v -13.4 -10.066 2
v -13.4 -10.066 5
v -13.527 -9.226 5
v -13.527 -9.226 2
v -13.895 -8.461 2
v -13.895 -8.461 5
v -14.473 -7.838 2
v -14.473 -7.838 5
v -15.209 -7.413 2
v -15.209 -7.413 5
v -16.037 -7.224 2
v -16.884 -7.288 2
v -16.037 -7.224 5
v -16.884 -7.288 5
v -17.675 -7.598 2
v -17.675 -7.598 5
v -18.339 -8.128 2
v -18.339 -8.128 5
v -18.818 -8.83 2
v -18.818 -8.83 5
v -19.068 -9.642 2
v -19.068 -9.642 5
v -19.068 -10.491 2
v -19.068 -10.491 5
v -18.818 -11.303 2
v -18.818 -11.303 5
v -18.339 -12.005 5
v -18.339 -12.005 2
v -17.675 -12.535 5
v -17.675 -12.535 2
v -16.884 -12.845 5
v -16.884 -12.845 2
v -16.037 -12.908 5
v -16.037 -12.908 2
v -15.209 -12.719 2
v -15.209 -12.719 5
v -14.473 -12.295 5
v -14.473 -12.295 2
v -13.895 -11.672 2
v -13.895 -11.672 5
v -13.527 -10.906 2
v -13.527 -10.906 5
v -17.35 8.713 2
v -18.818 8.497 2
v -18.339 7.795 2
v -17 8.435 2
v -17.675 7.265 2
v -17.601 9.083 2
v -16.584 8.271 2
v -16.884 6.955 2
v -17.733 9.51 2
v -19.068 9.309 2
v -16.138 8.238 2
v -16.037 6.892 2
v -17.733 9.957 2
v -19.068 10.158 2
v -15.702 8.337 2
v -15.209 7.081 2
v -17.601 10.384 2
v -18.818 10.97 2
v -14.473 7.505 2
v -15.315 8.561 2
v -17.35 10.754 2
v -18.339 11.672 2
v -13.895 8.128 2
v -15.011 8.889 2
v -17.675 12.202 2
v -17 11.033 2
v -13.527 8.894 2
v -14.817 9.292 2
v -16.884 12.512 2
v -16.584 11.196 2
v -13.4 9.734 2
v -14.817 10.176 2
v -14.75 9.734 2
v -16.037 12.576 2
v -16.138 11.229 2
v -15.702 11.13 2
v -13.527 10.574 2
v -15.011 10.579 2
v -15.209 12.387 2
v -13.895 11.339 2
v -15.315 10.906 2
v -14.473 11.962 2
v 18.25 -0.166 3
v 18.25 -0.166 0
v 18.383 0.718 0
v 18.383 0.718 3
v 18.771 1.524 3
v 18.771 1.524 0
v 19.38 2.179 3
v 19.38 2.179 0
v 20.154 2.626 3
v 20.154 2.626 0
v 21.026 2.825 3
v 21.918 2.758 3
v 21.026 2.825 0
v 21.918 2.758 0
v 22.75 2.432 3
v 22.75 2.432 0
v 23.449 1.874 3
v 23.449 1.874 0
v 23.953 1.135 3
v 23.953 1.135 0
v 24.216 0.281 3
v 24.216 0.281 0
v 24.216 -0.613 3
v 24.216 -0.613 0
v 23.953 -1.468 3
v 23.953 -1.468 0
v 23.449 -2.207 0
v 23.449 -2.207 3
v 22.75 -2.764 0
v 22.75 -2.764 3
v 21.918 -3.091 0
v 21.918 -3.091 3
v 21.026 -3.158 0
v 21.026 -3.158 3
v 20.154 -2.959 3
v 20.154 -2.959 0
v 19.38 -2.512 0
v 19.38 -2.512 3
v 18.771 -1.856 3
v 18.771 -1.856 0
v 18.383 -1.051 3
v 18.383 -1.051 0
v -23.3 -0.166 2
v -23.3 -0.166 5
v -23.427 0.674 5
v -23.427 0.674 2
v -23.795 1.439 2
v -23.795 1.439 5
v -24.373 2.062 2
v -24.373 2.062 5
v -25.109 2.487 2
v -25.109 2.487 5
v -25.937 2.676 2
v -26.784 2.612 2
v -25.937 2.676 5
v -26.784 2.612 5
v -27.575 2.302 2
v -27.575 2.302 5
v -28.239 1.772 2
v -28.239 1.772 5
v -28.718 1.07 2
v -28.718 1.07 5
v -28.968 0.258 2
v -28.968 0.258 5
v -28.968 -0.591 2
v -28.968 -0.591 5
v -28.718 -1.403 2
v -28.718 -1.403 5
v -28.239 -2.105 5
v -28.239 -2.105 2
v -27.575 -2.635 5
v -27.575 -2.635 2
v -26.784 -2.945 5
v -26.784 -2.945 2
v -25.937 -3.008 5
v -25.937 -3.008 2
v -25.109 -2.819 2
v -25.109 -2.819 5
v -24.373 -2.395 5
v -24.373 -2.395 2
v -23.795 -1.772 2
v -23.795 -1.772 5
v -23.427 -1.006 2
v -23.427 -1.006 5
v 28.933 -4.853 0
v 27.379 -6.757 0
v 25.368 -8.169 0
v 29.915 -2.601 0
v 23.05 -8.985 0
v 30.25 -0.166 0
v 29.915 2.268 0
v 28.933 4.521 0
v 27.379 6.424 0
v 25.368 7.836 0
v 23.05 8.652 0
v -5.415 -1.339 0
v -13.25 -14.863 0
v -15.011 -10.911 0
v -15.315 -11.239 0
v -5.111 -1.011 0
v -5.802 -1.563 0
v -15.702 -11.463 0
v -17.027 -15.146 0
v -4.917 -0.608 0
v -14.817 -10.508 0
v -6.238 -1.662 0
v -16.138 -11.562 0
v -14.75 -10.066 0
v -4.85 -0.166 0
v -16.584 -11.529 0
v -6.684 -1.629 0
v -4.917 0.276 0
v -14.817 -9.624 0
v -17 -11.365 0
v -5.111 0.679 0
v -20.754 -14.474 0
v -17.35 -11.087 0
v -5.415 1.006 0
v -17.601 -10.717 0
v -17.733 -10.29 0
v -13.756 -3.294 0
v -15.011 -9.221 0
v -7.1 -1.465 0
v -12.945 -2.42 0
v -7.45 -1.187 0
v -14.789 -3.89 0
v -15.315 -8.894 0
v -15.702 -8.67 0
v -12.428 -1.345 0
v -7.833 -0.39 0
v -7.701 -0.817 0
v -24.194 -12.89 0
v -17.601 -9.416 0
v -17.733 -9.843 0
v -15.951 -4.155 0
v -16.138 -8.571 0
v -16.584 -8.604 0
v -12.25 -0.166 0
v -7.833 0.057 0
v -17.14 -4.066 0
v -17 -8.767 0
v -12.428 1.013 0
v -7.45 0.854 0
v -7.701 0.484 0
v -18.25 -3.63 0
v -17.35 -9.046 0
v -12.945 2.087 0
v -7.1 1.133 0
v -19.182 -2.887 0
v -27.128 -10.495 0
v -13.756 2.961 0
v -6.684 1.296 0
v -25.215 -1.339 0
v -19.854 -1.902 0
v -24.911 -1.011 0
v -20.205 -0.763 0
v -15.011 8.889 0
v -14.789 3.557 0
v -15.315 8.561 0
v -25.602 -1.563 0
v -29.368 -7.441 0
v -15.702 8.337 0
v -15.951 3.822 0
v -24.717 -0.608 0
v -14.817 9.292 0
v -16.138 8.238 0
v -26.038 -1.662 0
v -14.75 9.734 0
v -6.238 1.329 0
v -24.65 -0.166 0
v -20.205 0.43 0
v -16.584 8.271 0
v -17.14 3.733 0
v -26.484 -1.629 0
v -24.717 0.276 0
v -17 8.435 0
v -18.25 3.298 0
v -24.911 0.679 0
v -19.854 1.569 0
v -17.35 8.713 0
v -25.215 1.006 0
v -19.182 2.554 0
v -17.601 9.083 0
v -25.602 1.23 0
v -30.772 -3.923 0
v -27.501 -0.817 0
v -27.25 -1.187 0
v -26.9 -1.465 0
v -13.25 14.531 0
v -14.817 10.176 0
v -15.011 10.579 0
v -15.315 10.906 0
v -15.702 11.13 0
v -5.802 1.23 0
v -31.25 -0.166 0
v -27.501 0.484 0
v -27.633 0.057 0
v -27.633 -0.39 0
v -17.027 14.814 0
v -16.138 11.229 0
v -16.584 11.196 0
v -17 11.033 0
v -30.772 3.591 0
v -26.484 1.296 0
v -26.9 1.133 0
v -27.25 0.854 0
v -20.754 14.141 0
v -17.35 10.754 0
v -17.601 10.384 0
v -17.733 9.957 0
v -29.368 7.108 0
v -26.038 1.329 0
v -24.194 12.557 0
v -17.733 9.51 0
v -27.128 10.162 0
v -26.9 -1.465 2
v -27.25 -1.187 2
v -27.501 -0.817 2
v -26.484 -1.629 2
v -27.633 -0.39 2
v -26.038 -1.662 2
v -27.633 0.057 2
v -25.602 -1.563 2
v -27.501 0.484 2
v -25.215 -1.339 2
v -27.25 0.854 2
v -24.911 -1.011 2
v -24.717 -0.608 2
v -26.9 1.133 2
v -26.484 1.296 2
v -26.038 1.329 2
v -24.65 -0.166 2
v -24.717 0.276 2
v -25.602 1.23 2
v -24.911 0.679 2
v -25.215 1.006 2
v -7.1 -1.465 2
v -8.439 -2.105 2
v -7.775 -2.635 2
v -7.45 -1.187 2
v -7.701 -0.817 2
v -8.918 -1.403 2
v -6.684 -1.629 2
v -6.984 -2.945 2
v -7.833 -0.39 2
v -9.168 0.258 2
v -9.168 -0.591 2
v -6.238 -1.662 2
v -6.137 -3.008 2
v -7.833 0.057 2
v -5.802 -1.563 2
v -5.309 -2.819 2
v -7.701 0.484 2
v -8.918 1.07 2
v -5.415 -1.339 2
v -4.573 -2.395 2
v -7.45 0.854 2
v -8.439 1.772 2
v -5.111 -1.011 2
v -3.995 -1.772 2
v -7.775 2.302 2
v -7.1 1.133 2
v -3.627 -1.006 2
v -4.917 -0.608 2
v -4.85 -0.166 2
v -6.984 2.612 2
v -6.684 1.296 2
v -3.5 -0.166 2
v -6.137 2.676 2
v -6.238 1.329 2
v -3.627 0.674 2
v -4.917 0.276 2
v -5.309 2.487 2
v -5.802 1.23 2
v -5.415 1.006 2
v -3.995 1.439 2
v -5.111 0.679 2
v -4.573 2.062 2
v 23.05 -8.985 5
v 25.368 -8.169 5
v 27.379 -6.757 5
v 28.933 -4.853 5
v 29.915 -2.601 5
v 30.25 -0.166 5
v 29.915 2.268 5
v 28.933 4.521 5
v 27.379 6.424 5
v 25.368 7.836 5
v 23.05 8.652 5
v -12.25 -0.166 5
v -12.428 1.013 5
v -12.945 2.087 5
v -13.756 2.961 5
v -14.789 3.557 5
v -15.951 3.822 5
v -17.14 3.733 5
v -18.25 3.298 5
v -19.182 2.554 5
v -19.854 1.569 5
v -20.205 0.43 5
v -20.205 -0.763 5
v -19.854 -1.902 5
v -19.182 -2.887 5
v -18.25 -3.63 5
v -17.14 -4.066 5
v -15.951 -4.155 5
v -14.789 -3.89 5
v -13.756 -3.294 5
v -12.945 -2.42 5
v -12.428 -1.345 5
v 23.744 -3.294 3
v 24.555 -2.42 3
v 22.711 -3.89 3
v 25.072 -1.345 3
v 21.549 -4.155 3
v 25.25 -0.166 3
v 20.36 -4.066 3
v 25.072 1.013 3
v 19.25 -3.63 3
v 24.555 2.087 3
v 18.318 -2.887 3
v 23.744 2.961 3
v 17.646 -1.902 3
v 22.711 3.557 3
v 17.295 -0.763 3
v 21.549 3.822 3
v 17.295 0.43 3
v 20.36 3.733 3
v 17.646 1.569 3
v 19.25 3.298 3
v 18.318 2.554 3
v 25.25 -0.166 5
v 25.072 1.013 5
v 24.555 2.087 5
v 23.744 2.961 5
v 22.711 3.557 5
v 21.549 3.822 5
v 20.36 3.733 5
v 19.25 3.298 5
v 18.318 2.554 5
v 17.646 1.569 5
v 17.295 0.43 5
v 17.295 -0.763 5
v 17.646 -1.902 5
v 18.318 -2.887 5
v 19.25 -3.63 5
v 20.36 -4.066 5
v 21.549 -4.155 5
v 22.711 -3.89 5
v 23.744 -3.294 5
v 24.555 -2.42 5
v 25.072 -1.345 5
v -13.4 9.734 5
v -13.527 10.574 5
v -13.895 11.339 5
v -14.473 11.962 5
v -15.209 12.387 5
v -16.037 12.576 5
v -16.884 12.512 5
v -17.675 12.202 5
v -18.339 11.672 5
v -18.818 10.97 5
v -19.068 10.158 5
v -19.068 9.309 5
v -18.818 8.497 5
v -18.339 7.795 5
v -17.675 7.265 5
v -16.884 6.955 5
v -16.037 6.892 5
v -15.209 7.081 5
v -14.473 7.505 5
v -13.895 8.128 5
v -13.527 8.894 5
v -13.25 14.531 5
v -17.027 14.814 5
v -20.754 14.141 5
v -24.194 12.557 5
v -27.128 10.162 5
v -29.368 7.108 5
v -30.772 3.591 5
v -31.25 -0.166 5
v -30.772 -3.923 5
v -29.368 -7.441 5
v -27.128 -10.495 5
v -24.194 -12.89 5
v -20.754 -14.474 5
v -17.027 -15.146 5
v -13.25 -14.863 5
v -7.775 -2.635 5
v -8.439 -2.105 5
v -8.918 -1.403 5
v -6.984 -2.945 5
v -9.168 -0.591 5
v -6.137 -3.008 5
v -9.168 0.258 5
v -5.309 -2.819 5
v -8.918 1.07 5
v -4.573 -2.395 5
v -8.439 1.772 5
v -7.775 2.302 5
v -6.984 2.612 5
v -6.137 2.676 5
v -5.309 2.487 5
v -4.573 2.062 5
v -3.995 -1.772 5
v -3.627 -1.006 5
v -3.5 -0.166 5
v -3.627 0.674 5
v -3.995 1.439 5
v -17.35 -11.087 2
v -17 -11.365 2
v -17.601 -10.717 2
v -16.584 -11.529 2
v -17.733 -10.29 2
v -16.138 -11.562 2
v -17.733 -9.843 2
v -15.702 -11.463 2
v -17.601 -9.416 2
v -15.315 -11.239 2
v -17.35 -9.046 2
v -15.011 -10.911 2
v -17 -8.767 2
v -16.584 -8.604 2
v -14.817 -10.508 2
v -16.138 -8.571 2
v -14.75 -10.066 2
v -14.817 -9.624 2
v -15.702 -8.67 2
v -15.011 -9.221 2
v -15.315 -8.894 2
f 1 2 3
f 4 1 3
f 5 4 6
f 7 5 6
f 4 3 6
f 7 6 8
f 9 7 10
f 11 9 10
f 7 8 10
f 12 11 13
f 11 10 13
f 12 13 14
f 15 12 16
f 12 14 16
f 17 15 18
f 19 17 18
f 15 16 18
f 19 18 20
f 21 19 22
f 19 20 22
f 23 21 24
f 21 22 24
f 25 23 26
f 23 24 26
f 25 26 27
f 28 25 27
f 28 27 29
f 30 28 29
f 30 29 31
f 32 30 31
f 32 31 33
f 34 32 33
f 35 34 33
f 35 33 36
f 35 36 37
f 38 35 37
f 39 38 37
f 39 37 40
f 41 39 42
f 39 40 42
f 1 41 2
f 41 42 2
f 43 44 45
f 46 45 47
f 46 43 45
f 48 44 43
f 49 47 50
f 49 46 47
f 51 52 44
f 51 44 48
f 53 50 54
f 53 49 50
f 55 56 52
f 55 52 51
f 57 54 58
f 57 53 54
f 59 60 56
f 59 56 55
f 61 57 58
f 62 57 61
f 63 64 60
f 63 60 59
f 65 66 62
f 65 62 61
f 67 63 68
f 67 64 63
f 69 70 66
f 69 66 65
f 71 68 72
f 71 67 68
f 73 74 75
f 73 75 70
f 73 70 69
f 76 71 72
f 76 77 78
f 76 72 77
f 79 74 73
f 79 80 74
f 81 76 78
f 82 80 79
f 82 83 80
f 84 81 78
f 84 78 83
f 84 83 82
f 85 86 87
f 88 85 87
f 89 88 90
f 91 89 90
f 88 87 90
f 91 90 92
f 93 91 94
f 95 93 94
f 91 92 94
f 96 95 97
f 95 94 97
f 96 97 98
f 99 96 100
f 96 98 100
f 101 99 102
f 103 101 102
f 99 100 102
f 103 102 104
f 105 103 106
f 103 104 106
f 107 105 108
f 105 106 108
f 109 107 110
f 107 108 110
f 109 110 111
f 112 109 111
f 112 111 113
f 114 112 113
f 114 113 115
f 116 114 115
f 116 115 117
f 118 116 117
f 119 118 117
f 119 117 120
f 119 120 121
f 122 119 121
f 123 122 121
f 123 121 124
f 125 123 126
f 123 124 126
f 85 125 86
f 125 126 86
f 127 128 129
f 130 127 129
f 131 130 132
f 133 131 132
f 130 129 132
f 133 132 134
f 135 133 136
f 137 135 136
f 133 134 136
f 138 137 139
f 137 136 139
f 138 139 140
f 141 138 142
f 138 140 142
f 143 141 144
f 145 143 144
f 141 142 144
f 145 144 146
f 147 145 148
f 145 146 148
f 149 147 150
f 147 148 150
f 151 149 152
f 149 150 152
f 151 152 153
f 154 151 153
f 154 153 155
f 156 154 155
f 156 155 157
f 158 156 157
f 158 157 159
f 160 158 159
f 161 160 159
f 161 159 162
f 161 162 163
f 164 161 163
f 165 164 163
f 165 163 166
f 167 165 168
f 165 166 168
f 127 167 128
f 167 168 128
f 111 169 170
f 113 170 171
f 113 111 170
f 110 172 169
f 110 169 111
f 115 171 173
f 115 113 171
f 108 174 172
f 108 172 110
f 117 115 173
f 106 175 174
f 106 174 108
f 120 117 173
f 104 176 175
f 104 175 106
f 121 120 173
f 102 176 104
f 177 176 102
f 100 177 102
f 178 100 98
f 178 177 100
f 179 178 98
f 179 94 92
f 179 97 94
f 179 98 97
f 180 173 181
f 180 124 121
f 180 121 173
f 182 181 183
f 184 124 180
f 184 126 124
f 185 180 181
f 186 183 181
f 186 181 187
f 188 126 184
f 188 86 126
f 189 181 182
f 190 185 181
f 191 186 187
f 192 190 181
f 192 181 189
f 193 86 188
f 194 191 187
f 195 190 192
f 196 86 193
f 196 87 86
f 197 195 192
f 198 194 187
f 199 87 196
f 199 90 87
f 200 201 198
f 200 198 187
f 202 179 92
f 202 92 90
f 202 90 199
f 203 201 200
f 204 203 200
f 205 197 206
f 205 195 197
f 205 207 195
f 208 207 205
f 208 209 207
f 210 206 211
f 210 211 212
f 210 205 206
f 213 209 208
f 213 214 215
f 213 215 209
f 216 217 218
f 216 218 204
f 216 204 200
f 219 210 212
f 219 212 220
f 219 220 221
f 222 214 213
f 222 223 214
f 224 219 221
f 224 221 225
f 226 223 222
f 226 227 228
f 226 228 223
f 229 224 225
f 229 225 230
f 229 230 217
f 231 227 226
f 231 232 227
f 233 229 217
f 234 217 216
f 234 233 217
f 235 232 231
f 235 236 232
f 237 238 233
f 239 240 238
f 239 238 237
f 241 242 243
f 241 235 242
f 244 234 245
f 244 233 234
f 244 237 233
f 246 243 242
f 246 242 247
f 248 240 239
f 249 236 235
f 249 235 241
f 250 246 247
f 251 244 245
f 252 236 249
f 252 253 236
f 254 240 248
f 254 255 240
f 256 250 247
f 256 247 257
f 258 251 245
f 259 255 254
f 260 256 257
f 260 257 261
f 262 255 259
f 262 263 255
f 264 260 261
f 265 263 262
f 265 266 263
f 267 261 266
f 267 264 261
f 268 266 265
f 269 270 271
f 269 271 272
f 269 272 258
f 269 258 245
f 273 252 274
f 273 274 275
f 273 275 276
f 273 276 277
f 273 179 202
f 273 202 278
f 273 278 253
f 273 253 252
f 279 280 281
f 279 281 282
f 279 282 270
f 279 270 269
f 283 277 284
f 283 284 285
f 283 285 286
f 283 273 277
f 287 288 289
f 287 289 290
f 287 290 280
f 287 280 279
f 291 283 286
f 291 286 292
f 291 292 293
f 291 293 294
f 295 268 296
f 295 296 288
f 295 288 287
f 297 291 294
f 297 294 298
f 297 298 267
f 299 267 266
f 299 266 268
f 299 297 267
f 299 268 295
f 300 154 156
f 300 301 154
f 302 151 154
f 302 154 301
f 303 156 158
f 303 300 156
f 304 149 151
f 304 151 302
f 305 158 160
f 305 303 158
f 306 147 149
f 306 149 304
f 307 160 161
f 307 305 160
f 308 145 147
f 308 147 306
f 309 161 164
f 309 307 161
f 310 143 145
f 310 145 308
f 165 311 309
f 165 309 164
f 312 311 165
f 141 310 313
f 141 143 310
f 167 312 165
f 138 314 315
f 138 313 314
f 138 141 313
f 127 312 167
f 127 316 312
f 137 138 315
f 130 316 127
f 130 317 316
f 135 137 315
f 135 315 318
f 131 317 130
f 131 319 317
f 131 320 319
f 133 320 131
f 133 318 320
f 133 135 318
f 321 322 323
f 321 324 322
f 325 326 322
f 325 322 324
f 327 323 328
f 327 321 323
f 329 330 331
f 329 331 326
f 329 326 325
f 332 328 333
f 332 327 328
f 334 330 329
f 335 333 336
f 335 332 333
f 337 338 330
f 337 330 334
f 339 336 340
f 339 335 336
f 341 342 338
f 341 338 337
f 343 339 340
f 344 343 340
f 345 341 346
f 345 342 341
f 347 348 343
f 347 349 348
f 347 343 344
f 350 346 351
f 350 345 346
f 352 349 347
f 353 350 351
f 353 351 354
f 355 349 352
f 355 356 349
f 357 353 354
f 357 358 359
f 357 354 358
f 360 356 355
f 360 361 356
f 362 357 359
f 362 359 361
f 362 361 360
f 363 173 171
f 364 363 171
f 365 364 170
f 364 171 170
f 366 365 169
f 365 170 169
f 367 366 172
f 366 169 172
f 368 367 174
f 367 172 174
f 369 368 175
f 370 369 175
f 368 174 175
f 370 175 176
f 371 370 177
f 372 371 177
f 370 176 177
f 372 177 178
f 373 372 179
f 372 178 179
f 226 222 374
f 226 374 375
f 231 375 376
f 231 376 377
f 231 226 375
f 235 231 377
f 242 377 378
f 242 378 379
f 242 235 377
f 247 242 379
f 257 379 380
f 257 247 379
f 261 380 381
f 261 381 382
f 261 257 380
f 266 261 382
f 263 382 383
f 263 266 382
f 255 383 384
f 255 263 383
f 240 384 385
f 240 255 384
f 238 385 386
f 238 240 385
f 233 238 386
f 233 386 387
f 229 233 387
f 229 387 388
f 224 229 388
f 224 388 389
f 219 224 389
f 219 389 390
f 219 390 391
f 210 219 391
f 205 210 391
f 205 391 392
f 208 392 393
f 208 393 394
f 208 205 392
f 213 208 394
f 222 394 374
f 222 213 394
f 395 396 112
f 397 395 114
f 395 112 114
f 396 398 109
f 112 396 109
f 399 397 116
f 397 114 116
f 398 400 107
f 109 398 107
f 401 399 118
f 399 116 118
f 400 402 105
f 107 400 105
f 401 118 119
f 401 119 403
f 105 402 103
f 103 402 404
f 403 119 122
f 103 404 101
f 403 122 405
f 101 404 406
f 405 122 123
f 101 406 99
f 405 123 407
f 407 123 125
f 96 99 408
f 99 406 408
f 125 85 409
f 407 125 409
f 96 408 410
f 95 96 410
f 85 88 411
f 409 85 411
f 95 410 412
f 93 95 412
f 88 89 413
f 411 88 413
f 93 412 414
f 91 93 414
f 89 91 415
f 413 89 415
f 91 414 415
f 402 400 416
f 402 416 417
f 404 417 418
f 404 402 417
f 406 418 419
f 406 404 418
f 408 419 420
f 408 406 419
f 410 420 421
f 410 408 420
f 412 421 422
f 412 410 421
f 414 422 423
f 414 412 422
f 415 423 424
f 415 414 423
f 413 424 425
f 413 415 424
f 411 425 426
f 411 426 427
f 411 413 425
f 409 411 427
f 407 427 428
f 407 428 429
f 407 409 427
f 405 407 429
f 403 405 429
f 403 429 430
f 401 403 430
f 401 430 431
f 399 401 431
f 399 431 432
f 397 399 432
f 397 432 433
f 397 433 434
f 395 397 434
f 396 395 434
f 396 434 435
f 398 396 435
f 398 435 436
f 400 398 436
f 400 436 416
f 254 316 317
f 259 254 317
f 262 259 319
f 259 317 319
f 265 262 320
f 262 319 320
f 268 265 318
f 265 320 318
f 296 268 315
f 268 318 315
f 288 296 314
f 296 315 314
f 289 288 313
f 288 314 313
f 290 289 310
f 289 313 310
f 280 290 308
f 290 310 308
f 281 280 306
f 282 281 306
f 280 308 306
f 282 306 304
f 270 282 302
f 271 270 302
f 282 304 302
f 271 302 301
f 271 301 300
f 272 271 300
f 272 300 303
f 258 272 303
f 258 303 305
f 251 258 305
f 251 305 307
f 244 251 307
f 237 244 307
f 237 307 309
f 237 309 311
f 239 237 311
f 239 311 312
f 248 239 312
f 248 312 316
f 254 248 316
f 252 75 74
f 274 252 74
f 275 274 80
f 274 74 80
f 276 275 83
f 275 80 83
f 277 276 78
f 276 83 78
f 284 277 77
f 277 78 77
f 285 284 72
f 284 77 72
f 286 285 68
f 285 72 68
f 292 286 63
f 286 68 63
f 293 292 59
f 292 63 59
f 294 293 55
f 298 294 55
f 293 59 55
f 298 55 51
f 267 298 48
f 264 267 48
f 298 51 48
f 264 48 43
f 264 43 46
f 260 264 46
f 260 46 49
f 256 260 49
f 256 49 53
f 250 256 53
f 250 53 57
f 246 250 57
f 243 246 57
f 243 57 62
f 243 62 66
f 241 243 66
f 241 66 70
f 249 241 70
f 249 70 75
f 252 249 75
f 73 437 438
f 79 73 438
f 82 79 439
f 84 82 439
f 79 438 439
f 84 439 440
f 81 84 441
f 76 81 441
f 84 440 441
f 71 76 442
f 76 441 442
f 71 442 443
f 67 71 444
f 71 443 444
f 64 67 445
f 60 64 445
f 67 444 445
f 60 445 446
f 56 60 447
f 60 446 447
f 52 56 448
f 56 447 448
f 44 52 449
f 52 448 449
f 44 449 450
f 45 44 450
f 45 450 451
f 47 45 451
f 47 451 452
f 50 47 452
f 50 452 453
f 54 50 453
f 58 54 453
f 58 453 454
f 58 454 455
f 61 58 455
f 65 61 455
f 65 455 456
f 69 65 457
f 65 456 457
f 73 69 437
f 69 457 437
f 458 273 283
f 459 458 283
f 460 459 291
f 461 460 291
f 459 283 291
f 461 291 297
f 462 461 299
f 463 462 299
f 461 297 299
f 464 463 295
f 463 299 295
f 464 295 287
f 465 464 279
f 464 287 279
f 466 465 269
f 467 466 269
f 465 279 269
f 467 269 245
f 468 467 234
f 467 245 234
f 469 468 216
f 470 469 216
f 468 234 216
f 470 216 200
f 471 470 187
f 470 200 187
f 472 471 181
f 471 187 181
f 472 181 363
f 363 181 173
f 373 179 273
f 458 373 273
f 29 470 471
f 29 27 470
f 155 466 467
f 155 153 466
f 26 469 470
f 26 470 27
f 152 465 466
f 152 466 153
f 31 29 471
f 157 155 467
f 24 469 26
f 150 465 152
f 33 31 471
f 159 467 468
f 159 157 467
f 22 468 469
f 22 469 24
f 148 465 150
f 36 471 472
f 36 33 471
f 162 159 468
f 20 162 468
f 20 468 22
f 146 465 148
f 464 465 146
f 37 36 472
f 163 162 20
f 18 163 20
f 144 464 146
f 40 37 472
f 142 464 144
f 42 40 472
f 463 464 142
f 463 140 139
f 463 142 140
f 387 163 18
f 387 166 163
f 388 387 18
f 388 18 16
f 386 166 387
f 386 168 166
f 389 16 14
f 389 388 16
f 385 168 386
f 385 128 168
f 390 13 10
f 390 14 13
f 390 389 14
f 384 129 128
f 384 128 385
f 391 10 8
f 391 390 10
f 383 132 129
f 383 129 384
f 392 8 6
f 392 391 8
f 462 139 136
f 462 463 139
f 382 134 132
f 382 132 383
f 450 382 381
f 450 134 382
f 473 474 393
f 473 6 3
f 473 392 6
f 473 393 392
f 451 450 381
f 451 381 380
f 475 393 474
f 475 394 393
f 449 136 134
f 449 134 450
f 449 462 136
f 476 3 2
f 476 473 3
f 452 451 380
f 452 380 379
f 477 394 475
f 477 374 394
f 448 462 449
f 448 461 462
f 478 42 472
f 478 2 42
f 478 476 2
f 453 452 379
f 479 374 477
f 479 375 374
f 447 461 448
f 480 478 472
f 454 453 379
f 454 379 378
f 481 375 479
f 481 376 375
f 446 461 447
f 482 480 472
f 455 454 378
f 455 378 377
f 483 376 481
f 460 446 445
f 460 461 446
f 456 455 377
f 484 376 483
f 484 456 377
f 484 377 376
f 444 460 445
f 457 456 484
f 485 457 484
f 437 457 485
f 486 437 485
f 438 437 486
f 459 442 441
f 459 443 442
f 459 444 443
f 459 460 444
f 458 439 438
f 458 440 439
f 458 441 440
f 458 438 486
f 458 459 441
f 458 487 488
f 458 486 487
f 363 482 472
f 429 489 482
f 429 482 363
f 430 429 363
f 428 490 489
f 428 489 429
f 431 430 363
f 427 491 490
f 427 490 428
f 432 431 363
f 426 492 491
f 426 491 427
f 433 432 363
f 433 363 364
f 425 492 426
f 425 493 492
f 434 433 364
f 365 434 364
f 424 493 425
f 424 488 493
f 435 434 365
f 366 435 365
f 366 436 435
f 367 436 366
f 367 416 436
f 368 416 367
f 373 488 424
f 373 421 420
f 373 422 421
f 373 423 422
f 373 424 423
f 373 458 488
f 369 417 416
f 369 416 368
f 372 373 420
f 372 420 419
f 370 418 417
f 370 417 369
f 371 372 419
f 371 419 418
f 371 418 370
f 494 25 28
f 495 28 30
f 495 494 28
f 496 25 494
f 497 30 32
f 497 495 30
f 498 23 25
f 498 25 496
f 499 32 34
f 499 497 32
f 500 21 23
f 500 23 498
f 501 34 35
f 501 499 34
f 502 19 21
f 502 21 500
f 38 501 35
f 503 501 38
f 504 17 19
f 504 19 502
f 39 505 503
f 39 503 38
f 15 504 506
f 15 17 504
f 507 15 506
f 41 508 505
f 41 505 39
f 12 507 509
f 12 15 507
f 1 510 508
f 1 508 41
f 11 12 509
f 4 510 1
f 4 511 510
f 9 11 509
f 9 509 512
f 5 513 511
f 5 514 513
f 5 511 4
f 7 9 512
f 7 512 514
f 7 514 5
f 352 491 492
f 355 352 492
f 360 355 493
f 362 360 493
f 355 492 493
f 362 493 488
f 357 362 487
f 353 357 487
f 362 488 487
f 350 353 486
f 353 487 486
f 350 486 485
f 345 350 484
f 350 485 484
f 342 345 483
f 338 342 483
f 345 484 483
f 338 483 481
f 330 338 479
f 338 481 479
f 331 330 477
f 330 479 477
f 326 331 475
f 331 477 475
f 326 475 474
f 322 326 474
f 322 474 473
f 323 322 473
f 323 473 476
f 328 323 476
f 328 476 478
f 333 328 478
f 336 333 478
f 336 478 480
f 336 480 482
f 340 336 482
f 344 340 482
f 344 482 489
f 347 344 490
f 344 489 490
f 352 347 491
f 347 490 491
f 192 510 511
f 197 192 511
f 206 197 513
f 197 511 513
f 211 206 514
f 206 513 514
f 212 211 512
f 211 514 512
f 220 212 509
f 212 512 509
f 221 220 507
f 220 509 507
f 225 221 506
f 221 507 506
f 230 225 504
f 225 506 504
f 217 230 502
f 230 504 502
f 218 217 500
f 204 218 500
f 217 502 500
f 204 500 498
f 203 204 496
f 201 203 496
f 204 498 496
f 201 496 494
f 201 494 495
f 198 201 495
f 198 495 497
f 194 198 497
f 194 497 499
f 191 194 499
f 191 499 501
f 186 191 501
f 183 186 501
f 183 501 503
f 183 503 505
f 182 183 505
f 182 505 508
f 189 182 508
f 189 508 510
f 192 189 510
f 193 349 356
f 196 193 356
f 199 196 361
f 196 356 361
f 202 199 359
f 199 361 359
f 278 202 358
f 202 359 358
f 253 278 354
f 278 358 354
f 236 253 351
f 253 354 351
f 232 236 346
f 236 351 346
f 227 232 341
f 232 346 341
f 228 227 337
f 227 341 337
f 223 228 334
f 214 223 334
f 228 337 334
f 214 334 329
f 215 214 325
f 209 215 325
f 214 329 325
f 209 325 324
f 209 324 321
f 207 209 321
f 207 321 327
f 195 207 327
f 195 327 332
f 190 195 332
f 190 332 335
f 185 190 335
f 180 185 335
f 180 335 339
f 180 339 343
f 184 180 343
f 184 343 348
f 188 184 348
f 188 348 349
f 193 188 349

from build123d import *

# Parameters (mm, degrees)
SKETCH_1_R          = 4
EXTRUDE_1_DEPTH     = 5
SKETCH_2_R          = 4
SKETCH_2_R_2        = 3
EXTRUDE_2_DEPTH     = 3
SKETCH_3_R          = 1.5
CUT_EXTRUDE_1_DEPTH = 10
SKETCH_4_R          = 2.85
CUT_EXTRUDE_2_DEPTH = 3


with BuildPart() as part:
    # 草图1 → 凸台-拉伸1 (new body)
    with BuildSketch(Plane.XY):
        with BuildLine():
            Line((23.05, 8.65181281), (-13.25, 14.530588193))
            ThreePointArc((-13.25, 14.530588193), (-31.25, -0.166350264), (-13.25, -14.86328872))
            Line((-13.25, -14.86328872), (23.05, -8.984513338))
            ThreePointArc((23.05, -8.984513338), (30.25, -0.166350264), (23.05, 8.65181281))
        make_face()
        with Locations((21.25, -0.166350264)):
            Circle(SKETCH_1_R, mode=Mode.SUBTRACT)
        with Locations((-16.25, -0.166350264)):
            Circle(SKETCH_1_R, mode=Mode.SUBTRACT)
    extrude(amount=EXTRUDE_1_DEPTH)

    # 草图2 → 凸台-拉伸2 (add)
    with BuildSketch(Plane(origin=(0, 0, 0), x_dir=(-1, 0, 0), z_dir=(0, 0, -1))):
        with Locations((-21.25, -0.166350264)):
            Circle(SKETCH_2_R)
        with Locations((-21.25, -0.166350264)):
            Circle(SKETCH_2_R_2, mode=Mode.SUBTRACT)
    extrude(amount=-EXTRUDE_2_DEPTH)

    # 草图3 → 切除-拉伸1 (cut)
    with BuildSketch(Plane.XY.offset(5)):
        with Locations((-16.25, 9.733649736)):
            Circle(SKETCH_3_R)
        with Locations((-6.35, -0.166350264)):
            Circle(SKETCH_3_R)
        with Locations((-26.15, -0.166350264)):
            Circle(SKETCH_3_R)
        with Locations((-16.25, -10.066350264)):
            Circle(SKETCH_3_R)
    extrude(amount=-CUT_EXTRUDE_1_DEPTH, mode=Mode.SUBTRACT)

    # 草图4 → 切除-拉伸2 (cut)
    with BuildSketch(Plane.XY.offset(5)):
        with Locations((-16.25, 9.733649736)):
            Circle(SKETCH_4_R)
        with Locations((-26.15, -0.166350264)):
            Circle(SKETCH_4_R)
        with Locations((-6.35, -0.166350264)):
            Circle(SKETCH_4_R)
        with Locations((-16.25, -10.066350264)):
            Circle(SKETCH_4_R)
    extrude(amount=-CUT_EXTRUDE_2_DEPTH, mode=Mode.SUBTRACT)


solid = part.part
